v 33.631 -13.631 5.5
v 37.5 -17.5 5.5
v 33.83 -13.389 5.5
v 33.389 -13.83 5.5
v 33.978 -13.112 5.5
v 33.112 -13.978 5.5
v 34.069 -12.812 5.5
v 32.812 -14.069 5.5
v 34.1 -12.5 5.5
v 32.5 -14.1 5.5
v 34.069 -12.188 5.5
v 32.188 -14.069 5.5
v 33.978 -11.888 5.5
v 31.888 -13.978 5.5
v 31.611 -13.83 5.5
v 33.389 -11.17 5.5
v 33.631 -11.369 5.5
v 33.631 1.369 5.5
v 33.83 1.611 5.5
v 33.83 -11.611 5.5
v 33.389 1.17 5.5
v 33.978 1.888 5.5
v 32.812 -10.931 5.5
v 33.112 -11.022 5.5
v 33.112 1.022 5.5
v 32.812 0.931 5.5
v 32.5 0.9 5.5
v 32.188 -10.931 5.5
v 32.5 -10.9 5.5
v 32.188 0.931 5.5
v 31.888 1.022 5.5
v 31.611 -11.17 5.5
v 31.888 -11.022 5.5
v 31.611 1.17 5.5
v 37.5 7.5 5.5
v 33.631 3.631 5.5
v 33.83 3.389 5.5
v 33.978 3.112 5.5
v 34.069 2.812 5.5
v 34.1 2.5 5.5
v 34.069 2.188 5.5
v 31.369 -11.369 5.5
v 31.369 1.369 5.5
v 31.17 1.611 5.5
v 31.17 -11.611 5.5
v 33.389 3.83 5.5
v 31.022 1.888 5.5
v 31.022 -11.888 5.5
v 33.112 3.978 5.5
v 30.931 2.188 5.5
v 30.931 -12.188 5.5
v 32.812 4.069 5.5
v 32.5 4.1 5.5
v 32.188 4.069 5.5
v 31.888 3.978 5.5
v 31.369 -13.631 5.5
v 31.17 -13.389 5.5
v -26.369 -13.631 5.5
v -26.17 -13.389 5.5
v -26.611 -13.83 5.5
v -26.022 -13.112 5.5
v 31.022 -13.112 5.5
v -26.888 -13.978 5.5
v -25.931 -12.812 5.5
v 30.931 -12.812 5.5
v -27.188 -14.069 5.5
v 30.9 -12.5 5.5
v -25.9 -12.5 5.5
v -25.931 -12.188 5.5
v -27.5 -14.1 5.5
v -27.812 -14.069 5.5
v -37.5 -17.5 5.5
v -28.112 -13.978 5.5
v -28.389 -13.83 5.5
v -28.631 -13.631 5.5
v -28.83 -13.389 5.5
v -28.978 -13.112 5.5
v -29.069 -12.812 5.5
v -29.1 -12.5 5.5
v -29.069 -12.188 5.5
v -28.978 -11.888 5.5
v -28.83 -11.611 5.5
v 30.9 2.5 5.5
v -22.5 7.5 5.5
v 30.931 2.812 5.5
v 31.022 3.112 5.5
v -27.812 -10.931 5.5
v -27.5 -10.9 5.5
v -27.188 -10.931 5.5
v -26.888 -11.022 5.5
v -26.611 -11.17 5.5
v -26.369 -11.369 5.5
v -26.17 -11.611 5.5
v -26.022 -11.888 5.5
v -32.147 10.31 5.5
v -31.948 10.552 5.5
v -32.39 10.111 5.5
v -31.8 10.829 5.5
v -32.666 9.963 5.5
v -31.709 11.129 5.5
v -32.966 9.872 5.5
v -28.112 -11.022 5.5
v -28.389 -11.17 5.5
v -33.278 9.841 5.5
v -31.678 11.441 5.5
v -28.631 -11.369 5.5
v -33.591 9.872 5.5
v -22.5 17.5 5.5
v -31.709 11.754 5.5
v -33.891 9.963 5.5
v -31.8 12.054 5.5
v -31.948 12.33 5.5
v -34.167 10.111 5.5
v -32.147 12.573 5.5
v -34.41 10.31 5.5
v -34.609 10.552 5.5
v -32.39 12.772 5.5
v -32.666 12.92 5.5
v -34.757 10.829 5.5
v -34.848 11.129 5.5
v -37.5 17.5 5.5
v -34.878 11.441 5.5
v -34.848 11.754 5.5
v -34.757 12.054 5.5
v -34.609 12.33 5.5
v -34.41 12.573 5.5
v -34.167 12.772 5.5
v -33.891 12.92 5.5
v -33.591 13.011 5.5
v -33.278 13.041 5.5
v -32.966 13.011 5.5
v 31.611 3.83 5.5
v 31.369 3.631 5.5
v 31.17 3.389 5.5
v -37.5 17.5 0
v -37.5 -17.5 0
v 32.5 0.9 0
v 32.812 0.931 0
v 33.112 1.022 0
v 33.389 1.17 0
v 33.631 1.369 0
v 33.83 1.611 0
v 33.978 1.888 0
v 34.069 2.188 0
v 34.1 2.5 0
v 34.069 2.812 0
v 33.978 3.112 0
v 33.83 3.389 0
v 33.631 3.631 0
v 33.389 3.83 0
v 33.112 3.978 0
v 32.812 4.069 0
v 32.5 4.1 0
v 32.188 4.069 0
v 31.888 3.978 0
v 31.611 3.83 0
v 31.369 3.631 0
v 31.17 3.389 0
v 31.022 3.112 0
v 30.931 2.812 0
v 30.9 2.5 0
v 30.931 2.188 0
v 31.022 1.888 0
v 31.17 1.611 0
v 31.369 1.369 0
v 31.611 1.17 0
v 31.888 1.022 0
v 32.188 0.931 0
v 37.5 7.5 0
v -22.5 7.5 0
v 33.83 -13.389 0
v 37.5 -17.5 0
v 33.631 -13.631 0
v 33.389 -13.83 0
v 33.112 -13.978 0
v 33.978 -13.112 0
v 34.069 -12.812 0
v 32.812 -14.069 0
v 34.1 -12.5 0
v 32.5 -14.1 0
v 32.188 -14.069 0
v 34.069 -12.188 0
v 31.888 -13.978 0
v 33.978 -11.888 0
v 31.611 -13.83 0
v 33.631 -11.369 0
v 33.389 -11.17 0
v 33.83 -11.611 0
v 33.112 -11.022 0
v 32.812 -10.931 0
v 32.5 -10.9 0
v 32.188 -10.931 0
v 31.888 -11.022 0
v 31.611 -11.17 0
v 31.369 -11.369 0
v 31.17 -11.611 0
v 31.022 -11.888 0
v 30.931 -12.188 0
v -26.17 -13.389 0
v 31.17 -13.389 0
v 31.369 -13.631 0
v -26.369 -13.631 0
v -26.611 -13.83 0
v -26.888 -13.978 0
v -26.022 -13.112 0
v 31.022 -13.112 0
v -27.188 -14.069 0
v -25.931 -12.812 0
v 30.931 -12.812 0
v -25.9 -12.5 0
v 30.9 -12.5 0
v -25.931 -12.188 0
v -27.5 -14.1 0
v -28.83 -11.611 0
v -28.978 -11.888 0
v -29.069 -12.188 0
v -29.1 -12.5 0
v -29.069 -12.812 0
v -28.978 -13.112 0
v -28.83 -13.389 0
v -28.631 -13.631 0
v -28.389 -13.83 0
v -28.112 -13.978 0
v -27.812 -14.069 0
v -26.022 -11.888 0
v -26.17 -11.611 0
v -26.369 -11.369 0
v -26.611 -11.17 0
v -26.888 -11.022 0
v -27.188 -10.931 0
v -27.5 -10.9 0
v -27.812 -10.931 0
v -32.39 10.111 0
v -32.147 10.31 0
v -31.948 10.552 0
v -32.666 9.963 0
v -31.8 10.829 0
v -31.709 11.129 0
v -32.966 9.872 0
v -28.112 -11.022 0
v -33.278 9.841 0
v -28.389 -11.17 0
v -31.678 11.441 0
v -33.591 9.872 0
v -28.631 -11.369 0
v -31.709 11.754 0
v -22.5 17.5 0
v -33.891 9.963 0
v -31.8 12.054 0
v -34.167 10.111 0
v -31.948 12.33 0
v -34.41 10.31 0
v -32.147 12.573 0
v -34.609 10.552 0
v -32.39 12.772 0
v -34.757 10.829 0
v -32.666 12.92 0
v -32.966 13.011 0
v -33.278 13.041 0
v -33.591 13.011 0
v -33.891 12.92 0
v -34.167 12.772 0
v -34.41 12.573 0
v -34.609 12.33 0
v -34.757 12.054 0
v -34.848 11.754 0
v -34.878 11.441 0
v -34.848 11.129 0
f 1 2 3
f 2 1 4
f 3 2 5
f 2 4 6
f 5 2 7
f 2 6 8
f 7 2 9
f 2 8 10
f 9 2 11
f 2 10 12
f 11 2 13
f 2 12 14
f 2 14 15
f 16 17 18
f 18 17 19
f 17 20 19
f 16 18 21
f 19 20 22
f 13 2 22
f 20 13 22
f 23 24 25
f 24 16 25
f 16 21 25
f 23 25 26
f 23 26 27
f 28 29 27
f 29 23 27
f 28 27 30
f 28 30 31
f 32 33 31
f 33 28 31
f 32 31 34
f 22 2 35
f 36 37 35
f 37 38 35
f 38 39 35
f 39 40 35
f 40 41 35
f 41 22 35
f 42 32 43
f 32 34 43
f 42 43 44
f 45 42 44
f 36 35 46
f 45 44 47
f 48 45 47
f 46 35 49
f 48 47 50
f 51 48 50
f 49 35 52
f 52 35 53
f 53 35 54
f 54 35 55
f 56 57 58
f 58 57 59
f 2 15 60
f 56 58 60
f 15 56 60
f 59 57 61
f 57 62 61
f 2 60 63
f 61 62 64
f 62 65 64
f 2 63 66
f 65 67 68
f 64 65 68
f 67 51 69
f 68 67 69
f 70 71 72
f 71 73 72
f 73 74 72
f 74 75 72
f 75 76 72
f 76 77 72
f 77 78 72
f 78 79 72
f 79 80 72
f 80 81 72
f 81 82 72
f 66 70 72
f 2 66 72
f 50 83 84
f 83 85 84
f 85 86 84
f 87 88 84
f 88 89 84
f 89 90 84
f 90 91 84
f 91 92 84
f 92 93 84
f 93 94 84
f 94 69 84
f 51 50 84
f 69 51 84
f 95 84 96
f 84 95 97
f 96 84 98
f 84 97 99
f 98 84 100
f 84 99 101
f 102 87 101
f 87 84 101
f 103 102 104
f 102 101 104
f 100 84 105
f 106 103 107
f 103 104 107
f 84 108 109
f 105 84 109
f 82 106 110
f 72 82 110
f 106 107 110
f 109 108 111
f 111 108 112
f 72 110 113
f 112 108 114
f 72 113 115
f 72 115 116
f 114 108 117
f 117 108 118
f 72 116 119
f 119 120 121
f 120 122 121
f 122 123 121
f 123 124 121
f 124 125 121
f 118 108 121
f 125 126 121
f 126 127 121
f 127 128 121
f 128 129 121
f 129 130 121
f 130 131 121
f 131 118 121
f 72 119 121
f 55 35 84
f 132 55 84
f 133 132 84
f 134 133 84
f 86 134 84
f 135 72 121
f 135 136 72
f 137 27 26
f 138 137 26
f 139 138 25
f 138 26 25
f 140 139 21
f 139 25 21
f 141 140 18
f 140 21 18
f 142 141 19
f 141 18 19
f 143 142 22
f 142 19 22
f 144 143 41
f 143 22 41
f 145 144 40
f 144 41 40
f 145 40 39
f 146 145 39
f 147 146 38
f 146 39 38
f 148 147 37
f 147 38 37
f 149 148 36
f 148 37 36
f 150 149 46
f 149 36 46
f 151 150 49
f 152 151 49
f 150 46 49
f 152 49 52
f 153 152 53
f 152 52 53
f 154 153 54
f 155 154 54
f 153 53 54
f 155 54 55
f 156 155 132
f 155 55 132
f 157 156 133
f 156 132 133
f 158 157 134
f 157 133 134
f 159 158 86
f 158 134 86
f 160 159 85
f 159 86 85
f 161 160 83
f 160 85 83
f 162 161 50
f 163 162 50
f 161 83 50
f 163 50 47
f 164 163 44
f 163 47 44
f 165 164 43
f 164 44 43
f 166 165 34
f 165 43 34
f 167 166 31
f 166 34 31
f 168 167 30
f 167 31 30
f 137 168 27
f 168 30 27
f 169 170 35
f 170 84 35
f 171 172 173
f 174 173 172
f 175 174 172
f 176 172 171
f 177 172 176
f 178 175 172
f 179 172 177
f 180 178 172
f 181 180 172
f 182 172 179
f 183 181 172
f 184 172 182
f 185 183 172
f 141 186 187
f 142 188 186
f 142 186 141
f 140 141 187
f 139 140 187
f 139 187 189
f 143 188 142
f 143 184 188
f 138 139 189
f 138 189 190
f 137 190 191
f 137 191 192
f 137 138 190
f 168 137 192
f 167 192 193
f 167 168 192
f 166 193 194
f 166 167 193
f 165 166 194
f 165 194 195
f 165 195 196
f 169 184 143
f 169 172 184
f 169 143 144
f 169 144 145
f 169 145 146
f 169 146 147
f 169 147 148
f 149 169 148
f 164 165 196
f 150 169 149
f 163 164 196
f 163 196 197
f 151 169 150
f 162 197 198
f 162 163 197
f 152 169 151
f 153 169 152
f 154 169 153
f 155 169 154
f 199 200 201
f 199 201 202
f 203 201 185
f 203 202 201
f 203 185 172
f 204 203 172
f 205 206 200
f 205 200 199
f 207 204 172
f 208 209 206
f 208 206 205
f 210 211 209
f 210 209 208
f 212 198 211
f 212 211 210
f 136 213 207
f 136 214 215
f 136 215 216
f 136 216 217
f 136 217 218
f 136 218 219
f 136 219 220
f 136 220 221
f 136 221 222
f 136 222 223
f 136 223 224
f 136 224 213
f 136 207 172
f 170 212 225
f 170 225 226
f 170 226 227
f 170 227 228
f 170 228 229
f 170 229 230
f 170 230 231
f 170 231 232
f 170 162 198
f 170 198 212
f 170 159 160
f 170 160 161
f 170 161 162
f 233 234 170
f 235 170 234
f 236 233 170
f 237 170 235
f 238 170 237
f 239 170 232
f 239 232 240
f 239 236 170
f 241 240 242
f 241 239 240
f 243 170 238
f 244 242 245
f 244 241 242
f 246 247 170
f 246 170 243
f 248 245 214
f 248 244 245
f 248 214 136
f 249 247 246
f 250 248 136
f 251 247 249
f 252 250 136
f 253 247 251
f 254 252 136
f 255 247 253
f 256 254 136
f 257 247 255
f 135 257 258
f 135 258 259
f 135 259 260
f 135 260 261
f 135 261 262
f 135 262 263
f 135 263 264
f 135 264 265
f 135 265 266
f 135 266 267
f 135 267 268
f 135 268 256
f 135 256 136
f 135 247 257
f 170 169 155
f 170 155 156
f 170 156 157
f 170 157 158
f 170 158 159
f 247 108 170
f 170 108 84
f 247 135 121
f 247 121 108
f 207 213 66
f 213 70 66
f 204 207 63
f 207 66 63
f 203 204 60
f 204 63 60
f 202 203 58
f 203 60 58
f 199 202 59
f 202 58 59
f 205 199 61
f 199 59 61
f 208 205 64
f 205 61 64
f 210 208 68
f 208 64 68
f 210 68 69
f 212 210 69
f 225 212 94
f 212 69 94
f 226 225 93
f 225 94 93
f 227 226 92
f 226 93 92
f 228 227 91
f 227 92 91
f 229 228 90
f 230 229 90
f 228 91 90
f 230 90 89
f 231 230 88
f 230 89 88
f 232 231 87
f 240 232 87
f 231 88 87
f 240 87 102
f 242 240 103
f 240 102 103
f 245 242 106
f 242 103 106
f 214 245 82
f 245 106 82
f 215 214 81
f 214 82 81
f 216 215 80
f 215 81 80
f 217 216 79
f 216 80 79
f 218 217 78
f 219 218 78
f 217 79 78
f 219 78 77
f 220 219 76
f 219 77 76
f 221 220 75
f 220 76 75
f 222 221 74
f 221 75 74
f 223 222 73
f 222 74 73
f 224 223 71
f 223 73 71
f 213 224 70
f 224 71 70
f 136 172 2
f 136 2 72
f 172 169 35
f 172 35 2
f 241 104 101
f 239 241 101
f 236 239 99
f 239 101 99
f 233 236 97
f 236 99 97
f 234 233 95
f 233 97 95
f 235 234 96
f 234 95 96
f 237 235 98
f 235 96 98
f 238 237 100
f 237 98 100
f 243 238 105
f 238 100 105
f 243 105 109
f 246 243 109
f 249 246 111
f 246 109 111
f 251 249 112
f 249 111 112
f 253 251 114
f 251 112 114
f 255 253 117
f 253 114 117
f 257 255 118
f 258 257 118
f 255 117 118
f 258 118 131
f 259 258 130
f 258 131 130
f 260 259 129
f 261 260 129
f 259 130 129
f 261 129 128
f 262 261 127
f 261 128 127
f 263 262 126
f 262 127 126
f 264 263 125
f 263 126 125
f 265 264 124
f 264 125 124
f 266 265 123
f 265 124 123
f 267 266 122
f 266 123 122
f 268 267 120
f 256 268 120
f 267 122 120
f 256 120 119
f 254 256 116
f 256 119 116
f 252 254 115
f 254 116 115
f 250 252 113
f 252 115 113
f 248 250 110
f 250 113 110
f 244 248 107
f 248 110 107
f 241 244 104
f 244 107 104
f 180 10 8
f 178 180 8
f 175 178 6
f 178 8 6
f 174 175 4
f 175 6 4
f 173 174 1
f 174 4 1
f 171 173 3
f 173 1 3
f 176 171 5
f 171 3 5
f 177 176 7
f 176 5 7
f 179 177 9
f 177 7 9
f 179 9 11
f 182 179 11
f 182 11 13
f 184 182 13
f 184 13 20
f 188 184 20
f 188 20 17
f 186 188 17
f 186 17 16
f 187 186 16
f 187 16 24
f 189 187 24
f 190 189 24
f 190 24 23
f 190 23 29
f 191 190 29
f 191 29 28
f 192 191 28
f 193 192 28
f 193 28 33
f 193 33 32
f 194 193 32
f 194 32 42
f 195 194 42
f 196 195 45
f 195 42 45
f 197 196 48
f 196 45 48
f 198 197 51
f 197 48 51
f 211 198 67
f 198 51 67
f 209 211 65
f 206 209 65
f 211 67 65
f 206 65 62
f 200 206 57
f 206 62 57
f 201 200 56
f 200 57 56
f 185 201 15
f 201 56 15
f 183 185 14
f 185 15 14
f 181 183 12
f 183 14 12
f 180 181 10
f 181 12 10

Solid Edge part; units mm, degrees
sketch "Sketch1" plane through (0, 0, 0) normal (0, 0, 1) x (1, 0, 0)
  line L0 (37.5, -17.5) -> (-37.5, -17.5)
  line L1 (-37.5, -17.5) -> (-37.5, 17.5)
  line L2 (-37.5, 17.5) -> (37.5, 17.5)
  line L3 (37.5, 17.5) -> (37.5, -17.5)
  dimension "D1" = 35
  dimension "D2" = 75
extrude "Protrusion1" add sketch "Sketch1" along normal blind 5.5
hole "Hole_1" at (32.5, -12.5, 5.5) direction (0, 0, -1) diameter 3.2 end up to next
sketch "Sketch2" plane through (0, 0, 5.5) normal (0, 0, 1) x (1, 0, 0)
  line L0 (-22.5, 17.5) -> (-22.5, 7.5)
  line L1 (-22.5, 7.5) -> (37.5, 7.5)
  dimension "D1" = 20
  dimension "D2" = 60
extrude "Cutout1" cut sketch "Sketch2" against normal through all material side at (-22.45, 12.5, 5.5)
hole "Hole_2" at (-33.2785, 11.4414, 5.5) direction (0, 0, -1) diameter 3.2 end up to next
hole "Hole1" at (32.5, 2.5, 5.5) direction (0, 0, -1) diameter 3.2 end up to next
hole "Hole2" at (-27.5, -12.5, 5.5) direction (0, 0, -1) diameter 3.2 end up to next
